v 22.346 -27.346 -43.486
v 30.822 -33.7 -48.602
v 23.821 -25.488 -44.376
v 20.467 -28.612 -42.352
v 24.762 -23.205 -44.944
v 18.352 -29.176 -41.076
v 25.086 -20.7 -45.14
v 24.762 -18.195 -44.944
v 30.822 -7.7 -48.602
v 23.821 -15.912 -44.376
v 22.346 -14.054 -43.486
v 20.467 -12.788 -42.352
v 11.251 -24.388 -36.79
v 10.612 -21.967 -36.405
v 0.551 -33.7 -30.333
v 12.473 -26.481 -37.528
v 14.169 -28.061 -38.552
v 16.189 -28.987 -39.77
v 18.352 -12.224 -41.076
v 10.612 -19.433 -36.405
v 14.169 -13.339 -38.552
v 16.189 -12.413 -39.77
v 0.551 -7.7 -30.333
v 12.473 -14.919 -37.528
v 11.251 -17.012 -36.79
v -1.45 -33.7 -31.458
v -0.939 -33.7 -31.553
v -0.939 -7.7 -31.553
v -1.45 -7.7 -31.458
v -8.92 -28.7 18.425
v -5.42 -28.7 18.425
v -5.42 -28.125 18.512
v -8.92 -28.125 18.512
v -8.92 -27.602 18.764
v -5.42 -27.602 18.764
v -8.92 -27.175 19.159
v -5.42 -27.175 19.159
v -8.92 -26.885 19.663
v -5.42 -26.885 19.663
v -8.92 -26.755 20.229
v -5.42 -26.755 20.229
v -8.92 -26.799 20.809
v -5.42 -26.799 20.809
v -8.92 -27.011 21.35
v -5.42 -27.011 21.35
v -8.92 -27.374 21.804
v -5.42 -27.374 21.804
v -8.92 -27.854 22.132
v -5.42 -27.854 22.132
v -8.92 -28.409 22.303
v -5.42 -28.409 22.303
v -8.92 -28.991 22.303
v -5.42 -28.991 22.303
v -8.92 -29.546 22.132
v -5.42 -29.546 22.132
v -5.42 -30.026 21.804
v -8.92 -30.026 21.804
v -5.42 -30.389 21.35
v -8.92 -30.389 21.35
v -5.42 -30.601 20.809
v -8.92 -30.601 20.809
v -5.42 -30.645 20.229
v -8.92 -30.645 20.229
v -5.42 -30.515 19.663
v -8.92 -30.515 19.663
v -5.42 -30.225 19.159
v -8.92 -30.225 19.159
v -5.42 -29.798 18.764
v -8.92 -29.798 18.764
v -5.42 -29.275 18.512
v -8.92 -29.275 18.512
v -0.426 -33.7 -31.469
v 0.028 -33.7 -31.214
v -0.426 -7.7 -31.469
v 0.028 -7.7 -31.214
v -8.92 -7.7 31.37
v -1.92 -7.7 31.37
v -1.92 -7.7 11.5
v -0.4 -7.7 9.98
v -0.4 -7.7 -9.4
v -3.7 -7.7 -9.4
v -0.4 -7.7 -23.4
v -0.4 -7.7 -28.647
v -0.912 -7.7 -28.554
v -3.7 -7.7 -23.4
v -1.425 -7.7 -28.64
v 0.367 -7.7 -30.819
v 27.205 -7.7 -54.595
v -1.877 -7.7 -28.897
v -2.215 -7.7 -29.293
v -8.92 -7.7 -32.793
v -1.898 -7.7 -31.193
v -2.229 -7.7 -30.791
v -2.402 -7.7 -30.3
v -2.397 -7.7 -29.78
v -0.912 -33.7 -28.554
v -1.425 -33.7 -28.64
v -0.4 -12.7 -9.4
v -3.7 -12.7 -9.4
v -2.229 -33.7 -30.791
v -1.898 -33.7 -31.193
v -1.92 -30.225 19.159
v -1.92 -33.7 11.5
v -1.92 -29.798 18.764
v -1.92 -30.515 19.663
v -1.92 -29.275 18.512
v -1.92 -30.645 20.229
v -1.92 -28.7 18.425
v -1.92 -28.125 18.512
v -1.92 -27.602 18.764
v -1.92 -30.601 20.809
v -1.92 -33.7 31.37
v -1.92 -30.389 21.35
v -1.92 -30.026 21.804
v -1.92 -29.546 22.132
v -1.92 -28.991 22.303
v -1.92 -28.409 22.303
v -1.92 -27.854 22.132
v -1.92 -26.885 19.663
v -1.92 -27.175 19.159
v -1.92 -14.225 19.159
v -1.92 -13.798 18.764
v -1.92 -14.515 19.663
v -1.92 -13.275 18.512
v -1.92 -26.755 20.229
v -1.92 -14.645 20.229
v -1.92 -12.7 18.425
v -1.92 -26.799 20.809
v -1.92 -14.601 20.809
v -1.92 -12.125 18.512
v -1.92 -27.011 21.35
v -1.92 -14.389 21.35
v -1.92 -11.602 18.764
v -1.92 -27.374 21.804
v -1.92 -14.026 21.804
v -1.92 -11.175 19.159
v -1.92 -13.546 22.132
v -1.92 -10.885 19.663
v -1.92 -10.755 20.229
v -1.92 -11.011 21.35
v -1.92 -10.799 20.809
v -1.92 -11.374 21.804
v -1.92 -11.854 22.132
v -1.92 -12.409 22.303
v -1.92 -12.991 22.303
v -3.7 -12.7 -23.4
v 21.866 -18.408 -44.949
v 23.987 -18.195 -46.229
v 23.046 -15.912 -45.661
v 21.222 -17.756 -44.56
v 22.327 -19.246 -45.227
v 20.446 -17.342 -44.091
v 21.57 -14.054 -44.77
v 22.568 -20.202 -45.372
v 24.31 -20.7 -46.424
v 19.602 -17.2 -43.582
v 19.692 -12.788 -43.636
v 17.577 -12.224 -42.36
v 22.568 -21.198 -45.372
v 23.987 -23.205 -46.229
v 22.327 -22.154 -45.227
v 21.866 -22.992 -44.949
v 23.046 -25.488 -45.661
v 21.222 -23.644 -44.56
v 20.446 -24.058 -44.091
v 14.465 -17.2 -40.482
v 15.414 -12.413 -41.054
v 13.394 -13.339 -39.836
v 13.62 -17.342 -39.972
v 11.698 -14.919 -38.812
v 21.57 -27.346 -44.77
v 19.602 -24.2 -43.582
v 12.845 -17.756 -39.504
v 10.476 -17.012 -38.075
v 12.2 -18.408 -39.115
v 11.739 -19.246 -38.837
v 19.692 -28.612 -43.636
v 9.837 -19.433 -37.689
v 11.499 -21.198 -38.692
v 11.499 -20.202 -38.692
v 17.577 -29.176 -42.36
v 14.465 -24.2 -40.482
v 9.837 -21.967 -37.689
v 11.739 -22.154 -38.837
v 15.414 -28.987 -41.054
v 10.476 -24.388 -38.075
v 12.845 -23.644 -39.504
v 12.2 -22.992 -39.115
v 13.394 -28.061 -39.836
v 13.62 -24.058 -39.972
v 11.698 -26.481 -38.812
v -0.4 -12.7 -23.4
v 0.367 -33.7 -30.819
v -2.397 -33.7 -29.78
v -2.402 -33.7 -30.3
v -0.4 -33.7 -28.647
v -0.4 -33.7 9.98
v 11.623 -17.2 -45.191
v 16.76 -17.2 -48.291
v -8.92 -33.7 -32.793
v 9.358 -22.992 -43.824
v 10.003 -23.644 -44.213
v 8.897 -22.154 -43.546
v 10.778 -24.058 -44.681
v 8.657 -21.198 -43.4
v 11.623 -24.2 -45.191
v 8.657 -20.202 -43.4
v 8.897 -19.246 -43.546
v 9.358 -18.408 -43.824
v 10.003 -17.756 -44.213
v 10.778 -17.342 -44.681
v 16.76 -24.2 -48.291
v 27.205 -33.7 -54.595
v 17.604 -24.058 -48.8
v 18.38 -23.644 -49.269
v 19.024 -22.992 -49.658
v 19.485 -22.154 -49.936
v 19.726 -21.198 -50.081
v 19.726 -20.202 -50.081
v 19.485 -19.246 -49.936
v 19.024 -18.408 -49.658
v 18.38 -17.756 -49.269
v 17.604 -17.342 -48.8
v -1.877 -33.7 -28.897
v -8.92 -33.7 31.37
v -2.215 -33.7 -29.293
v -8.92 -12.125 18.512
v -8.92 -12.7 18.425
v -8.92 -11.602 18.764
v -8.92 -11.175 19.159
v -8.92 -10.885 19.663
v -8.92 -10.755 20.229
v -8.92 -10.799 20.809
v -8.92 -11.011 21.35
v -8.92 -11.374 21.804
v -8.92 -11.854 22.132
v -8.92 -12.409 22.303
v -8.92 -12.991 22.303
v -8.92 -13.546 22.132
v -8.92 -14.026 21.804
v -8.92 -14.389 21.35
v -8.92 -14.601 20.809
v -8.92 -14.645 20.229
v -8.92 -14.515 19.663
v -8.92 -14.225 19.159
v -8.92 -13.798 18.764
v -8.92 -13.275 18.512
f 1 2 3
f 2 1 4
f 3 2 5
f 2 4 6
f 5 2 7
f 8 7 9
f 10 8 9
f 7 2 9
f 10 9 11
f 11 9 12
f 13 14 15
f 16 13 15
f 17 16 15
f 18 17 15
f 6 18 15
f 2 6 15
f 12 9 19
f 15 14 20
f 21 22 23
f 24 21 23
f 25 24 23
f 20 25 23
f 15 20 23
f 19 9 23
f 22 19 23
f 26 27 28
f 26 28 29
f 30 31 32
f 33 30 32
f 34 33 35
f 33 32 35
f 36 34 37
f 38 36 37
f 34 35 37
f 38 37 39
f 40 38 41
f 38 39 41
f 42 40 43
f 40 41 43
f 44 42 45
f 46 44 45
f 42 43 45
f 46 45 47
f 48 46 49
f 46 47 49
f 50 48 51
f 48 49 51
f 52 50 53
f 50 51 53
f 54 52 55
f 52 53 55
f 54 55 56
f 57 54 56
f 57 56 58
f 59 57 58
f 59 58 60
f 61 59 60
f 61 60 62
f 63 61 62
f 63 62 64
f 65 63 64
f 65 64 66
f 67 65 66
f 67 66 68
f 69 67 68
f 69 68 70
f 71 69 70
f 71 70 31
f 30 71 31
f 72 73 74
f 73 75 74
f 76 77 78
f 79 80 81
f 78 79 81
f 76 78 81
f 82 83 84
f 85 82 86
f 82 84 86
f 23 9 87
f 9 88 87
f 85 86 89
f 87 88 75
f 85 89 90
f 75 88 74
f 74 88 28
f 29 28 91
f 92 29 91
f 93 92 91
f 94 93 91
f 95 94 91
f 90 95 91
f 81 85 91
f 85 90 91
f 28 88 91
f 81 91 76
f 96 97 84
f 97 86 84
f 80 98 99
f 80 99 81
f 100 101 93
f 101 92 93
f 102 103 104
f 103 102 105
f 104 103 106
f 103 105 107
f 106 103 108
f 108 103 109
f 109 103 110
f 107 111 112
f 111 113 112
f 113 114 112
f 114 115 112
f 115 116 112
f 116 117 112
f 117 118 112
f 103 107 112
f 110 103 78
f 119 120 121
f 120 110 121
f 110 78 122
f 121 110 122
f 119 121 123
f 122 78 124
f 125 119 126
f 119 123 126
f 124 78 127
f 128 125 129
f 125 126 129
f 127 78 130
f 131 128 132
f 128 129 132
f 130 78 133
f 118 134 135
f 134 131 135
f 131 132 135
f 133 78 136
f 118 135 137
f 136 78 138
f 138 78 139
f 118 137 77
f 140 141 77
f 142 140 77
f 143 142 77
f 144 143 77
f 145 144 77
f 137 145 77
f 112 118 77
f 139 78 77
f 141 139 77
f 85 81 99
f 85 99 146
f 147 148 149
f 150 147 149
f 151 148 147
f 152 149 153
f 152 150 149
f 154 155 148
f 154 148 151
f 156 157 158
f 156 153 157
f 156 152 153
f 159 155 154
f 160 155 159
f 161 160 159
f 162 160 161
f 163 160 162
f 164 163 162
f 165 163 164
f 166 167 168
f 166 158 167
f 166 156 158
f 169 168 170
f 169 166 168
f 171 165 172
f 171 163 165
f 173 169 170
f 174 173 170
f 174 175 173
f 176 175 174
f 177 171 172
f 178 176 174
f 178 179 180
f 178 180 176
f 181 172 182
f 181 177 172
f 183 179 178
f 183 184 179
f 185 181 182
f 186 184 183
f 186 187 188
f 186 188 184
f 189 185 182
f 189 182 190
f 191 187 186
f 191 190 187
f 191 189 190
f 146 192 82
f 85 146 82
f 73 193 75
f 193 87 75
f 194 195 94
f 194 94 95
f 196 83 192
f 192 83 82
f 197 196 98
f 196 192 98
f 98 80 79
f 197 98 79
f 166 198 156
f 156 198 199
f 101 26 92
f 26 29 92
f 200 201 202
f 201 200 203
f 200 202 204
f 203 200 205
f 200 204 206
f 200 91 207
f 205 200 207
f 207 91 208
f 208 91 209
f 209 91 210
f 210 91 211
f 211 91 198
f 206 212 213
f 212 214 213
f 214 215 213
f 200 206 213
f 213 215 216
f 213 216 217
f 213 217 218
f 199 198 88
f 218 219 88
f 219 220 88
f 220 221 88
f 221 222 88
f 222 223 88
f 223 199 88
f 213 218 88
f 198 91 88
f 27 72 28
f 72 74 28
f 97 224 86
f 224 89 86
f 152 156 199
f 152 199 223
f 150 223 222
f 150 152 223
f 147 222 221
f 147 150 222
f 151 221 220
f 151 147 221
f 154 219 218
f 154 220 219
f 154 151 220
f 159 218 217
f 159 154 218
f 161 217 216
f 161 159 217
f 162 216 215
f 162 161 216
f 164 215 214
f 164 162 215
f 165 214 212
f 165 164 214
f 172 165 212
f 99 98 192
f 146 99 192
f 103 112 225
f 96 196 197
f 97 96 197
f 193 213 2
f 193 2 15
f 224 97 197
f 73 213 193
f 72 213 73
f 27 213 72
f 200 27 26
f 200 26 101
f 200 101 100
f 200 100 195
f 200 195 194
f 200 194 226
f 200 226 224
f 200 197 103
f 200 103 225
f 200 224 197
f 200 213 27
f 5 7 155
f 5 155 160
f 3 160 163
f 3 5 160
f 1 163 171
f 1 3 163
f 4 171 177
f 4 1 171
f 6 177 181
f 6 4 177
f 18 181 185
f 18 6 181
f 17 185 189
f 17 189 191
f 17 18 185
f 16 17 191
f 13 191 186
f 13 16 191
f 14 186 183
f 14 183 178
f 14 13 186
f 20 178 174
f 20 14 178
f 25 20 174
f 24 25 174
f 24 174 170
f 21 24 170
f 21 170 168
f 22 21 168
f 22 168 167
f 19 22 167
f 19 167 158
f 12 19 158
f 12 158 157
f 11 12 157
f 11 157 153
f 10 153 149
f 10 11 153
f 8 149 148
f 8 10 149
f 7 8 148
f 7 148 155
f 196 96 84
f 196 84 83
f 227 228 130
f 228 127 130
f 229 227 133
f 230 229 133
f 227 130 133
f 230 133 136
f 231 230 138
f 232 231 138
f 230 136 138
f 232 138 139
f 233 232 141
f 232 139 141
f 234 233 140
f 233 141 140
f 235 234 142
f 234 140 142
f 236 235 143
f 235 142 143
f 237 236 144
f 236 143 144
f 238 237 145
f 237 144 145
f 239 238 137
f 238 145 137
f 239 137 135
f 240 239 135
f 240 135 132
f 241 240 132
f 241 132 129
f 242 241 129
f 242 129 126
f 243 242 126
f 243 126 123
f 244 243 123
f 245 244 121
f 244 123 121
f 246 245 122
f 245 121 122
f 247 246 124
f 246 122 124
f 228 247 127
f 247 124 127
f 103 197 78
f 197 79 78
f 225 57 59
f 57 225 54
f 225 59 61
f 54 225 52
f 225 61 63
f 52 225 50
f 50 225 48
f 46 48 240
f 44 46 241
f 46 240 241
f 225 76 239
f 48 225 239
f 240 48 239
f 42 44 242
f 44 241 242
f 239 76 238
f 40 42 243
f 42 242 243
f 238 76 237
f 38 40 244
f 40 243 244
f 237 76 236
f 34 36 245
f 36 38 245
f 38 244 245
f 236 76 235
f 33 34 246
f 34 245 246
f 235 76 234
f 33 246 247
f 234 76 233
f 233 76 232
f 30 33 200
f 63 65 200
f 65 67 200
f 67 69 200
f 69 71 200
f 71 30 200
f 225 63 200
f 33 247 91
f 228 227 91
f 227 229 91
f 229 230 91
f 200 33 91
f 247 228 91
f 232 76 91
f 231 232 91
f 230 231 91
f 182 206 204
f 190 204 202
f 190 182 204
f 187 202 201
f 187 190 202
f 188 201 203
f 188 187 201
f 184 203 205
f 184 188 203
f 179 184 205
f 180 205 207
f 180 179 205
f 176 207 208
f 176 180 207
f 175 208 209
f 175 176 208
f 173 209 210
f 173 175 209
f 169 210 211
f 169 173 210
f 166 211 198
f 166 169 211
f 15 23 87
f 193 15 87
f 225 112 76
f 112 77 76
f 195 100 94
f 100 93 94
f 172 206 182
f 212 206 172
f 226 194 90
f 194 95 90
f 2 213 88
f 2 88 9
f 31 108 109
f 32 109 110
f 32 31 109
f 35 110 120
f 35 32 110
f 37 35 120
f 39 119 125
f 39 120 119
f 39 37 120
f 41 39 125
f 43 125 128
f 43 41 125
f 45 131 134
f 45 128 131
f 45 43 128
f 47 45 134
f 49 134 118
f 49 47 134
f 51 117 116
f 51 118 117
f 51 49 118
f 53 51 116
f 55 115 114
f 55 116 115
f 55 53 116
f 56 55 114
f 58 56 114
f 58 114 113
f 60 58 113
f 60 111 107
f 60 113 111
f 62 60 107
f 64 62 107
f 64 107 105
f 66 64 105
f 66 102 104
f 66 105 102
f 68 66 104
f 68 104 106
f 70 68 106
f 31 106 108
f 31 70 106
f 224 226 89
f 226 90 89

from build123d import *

# Parameters (mm, degrees)
LEG_AND_PAD_DEPTH          = 13
SCREW_HEAD_RELIEF_SKETCH_W = 14
SCREW_HEAD_RELIEF_SKETCH_H = 6
SCREW_HEAD_RELIEF_DEPTH    = 2.35
M6_SLOT_MIDDLE_DEPTH       = 3.5
SCREW_HOLES_SKETCH_R       = 1.95
SCREW_HOLES_DEPTH          = 4.5


with BuildPart() as part:
    # leg and pad sketch → leg and pad (new, symmetric)
    with BuildSketch(Plane(origin=(0, -20.7, 0), x_dir=(1, 0, 0), z_dir=(0, 1, 0))):
        Polygon((0.551289683, 30.332713936), (0.367250577, 30.819395741), (0.028023026, 31.213926146), (-0.425575667, 31.468833575), (-0.938966578, 31.553446481), (-1.450376329, 31.457583879), (-1.898269923, 31.192780366), (-2.228754897, 30.790898227), (-2.402065893, 30.30029363), (-2.397349395, 29.779998208), (-2.215172912, 29.292616119), (-1.877456693, 28.896791249), (-1.424836191, 28.640150931), (-0.91177263, 28.55357522), (-0.4, 28.647481273), (-0.4, -9.98), (-1.92, -11.5), (-1.92, -31.37), (-8.92, -31.37), (-8.92, 32.792642706), (27.204821487, 54.594667874), (30.821788068, 48.601542416), align=None)
    extrude(amount=LEG_AND_PAD_DEPTH, both=True)

    # screw head relief sketch → screw head relief (cut, symmetric)
    with BuildSketch(Plane(origin=(-1.35, 0, 0), x_dir=(0, 0, -1), z_dir=(1, 0, 0))):
        with Locations((16.4, -9.7)):
            Rectangle(SCREW_HEAD_RELIEF_SKETCH_W, SCREW_HEAD_RELIEF_SKETCH_H)
    extrude(amount=SCREW_HEAD_RELIEF_DEPTH, both=True, mode=Mode.SUBTRACT)

    # insert flange relief sketch → insert flange relief (revolve, cut)
    with BuildSketch(Plane(origin=(0, -20.7, 0), x_dir=(1, 0, 0), z_dir=(0, 1, 0)), mode=Mode.PRIVATE) as insert_flange_relief_sk:
        Polygon((18.324853729, 39.891397061), (17.03307995, 42.03179901), (9.755713323, 37.639768162), (11.047487102, 35.499366213), align=None)
    revolve(insert_flange_relief_sk.sketch.rotate(Axis((18.324853729, -20.7, -39.891397061), (-0.5167095115681243, 0, -0.8561607796757748)), 180), axis=Axis((18.324853729, -20.7, -39.891397061), (-0.5167095115681243, 0, -0.8561607796757748)), mode=Mode.SUBTRACT)

    # M6 slot end 1 sketch → M6 slot end 1 (revolve, cut)
    with BuildSketch(Plane(origin=(0, -20.7, 0), x_dir=(1, 0, 0), z_dir=(0, 1, 0)), mode=Mode.PRIVATE) as m6_slot_end_1_sk:
        Polygon((20.893336068, 41.441525596), (16.242950464, 49.146972613), (13.246387735, 47.338489322), (17.896773339, 39.633042305), align=None)
    revolve(m6_slot_end_1_sk.sketch.rotate(Axis((20.893336068, -20.7, -41.441525596), (-0.5167095115681233, 0, -0.8561607796757753)), 180), axis=Axis((20.893336068, -20.7, -41.441525596), (-0.5167095115681233, 0, -0.8561607796757753)), mode=Mode.SUBTRACT)

    # M6 slot end 2 sketch → M6 slot end 2 (revolve, cut)
    with BuildSketch(Plane(origin=(0, -20.7, 0), x_dir=(1, 0, 0), z_dir=(0, 1, 0))):
        Polygon((15.75637139, 38.341268526), (11.105985786, 46.046715543), (8.109423057, 44.238232253), (12.759808661, 36.532785236), align=None)
    revolve(axis=Axis((15.75637139, -20.7, -38.341268526), (-0.5167095115681234, 0, -0.8561607796757752)), mode=Mode.SUBTRACT)

    # M6 slot middle sketch → M6 slot middle (cut, symmetric)
    with BuildSketch(Plane(origin=(0, -20.7, 0), x_dir=(1, 0, 0), z_dir=(0, 1, 0))):
        Polygon((15.75637139, 38.341268526), (20.893336068, 41.441525596), (16.242950464, 49.146972613), (11.105985786, 46.046715543), align=None)
    extrude(amount=M6_SLOT_MIDDLE_DEPTH, both=True, mode=Mode.SUBTRACT)

    # screw holes sketch → screw holes (cut, symmetric)
    with BuildSketch(Plane(origin=(-5.42, 0, 0), x_dir=(0, 0, -1), z_dir=(1, 0, 0))):
        with Locations((-20.375, -28.7)):
            Circle(SCREW_HOLES_SKETCH_R)
        with Locations((-20.375, -12.7)):
            Circle(SCREW_HOLES_SKETCH_R)
    extrude(amount=SCREW_HOLES_DEPTH, both=True, mode=Mode.SUBTRACT)


solid = part.part
